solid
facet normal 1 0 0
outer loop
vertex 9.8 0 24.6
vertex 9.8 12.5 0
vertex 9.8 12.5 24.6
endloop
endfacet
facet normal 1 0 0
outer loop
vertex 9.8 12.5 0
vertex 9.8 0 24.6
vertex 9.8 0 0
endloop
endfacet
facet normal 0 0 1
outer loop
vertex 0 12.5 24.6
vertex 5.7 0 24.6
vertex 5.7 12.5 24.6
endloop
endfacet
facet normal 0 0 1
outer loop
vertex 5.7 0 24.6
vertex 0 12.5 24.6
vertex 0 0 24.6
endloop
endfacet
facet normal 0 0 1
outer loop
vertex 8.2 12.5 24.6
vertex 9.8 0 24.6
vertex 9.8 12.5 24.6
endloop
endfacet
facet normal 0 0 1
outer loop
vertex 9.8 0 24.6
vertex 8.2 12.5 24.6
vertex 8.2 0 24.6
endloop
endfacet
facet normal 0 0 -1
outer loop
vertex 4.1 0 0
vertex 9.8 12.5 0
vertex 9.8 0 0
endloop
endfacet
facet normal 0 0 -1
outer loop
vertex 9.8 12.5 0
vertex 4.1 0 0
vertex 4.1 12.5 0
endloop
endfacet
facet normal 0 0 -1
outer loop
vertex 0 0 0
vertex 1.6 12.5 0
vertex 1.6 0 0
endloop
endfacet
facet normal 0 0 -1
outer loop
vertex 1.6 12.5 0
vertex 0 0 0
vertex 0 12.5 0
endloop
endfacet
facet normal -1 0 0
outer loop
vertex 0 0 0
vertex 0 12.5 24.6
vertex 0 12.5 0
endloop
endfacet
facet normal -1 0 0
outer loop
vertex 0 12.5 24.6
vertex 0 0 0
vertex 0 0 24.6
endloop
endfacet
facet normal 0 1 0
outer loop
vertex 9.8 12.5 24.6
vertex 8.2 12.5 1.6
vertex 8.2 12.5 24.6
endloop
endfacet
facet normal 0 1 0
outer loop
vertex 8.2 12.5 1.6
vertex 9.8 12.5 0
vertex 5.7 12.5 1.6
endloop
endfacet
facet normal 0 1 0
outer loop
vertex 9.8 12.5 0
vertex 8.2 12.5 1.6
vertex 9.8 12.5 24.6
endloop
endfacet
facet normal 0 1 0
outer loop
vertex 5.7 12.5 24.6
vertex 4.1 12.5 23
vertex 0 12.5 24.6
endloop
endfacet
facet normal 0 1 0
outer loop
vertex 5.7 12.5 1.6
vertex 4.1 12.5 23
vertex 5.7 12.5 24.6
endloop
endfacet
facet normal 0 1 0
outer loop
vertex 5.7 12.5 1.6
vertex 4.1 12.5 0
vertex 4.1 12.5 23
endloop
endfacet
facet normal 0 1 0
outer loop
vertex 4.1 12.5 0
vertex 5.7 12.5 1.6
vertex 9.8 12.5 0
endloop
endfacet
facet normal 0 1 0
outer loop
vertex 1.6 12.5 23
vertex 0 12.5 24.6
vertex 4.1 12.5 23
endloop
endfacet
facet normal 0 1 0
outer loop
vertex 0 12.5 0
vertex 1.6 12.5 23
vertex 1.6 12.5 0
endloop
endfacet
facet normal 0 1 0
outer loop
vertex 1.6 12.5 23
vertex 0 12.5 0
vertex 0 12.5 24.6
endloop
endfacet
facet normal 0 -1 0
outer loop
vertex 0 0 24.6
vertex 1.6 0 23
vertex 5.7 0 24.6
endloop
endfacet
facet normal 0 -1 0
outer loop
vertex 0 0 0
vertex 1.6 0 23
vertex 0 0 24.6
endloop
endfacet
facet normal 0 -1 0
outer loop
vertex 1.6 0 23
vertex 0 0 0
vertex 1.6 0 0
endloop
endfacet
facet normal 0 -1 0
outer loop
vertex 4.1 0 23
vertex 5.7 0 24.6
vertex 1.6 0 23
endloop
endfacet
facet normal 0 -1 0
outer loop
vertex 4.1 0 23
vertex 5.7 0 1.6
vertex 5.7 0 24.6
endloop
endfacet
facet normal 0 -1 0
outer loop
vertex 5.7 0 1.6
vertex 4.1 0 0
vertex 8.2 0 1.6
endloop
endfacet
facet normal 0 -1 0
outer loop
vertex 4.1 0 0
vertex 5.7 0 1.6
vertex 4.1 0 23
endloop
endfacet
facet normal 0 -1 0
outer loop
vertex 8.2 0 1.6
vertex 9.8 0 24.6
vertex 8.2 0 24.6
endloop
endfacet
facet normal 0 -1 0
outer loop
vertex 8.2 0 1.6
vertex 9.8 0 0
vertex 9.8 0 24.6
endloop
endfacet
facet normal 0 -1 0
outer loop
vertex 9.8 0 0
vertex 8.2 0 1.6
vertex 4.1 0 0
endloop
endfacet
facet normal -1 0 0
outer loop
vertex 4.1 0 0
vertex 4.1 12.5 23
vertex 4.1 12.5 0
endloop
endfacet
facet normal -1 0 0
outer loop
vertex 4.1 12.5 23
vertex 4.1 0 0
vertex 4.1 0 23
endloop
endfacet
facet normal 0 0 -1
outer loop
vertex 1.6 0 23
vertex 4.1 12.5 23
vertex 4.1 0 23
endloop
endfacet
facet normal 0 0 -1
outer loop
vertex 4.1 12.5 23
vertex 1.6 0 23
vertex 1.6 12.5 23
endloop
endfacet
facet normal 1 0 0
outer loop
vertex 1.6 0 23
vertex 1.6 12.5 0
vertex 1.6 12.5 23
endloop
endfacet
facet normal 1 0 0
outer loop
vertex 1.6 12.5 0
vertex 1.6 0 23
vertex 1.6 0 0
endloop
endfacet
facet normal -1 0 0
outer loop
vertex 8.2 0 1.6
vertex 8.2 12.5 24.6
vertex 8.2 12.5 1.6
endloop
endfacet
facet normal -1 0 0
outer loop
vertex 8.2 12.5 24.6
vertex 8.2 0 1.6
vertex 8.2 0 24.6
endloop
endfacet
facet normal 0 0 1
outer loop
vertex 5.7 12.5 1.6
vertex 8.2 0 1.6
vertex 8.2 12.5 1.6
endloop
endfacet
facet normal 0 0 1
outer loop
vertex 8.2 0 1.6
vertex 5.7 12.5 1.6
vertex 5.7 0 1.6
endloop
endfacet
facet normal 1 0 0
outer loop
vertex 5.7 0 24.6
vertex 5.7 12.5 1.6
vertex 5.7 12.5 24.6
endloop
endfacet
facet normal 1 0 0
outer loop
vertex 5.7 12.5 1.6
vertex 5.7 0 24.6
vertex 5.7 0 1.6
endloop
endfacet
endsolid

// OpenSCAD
//This will adjust the open gap where the clip fits onto the gutter.
Gutter_Wall_Thickness = 2.5;
//The thickness of the clip walls. Try to make this a multiple of your printer nozzle width.
Coupling_wall_thickness = 1.6;
//How long do you want the coupling to be?
couplingLength = 12.5;//[5:50]


couplingWidth = 3*Coupling_wall_thickness + 2*Gutter_Wall_Thickness;
gutter_Coupling_Height = 24-1;
couplingHeight = gutter_Coupling_Height+Coupling_wall_thickness;



difference(){
    difference(){
        cube([couplingWidth,couplingLength,couplingHeight]);
        translate([Coupling_wall_thickness,0,0])
            cube([Gutter_Wall_Thickness,couplingLength ,gutter_Coupling_Height]);
    }
    translate([2*Coupling_wall_thickness+Gutter_Wall_Thickness,0,Coupling_wall_thickness])
        cube([Gutter_Wall_Thickness,couplingLength ,gutter_Coupling_Height]);
}
